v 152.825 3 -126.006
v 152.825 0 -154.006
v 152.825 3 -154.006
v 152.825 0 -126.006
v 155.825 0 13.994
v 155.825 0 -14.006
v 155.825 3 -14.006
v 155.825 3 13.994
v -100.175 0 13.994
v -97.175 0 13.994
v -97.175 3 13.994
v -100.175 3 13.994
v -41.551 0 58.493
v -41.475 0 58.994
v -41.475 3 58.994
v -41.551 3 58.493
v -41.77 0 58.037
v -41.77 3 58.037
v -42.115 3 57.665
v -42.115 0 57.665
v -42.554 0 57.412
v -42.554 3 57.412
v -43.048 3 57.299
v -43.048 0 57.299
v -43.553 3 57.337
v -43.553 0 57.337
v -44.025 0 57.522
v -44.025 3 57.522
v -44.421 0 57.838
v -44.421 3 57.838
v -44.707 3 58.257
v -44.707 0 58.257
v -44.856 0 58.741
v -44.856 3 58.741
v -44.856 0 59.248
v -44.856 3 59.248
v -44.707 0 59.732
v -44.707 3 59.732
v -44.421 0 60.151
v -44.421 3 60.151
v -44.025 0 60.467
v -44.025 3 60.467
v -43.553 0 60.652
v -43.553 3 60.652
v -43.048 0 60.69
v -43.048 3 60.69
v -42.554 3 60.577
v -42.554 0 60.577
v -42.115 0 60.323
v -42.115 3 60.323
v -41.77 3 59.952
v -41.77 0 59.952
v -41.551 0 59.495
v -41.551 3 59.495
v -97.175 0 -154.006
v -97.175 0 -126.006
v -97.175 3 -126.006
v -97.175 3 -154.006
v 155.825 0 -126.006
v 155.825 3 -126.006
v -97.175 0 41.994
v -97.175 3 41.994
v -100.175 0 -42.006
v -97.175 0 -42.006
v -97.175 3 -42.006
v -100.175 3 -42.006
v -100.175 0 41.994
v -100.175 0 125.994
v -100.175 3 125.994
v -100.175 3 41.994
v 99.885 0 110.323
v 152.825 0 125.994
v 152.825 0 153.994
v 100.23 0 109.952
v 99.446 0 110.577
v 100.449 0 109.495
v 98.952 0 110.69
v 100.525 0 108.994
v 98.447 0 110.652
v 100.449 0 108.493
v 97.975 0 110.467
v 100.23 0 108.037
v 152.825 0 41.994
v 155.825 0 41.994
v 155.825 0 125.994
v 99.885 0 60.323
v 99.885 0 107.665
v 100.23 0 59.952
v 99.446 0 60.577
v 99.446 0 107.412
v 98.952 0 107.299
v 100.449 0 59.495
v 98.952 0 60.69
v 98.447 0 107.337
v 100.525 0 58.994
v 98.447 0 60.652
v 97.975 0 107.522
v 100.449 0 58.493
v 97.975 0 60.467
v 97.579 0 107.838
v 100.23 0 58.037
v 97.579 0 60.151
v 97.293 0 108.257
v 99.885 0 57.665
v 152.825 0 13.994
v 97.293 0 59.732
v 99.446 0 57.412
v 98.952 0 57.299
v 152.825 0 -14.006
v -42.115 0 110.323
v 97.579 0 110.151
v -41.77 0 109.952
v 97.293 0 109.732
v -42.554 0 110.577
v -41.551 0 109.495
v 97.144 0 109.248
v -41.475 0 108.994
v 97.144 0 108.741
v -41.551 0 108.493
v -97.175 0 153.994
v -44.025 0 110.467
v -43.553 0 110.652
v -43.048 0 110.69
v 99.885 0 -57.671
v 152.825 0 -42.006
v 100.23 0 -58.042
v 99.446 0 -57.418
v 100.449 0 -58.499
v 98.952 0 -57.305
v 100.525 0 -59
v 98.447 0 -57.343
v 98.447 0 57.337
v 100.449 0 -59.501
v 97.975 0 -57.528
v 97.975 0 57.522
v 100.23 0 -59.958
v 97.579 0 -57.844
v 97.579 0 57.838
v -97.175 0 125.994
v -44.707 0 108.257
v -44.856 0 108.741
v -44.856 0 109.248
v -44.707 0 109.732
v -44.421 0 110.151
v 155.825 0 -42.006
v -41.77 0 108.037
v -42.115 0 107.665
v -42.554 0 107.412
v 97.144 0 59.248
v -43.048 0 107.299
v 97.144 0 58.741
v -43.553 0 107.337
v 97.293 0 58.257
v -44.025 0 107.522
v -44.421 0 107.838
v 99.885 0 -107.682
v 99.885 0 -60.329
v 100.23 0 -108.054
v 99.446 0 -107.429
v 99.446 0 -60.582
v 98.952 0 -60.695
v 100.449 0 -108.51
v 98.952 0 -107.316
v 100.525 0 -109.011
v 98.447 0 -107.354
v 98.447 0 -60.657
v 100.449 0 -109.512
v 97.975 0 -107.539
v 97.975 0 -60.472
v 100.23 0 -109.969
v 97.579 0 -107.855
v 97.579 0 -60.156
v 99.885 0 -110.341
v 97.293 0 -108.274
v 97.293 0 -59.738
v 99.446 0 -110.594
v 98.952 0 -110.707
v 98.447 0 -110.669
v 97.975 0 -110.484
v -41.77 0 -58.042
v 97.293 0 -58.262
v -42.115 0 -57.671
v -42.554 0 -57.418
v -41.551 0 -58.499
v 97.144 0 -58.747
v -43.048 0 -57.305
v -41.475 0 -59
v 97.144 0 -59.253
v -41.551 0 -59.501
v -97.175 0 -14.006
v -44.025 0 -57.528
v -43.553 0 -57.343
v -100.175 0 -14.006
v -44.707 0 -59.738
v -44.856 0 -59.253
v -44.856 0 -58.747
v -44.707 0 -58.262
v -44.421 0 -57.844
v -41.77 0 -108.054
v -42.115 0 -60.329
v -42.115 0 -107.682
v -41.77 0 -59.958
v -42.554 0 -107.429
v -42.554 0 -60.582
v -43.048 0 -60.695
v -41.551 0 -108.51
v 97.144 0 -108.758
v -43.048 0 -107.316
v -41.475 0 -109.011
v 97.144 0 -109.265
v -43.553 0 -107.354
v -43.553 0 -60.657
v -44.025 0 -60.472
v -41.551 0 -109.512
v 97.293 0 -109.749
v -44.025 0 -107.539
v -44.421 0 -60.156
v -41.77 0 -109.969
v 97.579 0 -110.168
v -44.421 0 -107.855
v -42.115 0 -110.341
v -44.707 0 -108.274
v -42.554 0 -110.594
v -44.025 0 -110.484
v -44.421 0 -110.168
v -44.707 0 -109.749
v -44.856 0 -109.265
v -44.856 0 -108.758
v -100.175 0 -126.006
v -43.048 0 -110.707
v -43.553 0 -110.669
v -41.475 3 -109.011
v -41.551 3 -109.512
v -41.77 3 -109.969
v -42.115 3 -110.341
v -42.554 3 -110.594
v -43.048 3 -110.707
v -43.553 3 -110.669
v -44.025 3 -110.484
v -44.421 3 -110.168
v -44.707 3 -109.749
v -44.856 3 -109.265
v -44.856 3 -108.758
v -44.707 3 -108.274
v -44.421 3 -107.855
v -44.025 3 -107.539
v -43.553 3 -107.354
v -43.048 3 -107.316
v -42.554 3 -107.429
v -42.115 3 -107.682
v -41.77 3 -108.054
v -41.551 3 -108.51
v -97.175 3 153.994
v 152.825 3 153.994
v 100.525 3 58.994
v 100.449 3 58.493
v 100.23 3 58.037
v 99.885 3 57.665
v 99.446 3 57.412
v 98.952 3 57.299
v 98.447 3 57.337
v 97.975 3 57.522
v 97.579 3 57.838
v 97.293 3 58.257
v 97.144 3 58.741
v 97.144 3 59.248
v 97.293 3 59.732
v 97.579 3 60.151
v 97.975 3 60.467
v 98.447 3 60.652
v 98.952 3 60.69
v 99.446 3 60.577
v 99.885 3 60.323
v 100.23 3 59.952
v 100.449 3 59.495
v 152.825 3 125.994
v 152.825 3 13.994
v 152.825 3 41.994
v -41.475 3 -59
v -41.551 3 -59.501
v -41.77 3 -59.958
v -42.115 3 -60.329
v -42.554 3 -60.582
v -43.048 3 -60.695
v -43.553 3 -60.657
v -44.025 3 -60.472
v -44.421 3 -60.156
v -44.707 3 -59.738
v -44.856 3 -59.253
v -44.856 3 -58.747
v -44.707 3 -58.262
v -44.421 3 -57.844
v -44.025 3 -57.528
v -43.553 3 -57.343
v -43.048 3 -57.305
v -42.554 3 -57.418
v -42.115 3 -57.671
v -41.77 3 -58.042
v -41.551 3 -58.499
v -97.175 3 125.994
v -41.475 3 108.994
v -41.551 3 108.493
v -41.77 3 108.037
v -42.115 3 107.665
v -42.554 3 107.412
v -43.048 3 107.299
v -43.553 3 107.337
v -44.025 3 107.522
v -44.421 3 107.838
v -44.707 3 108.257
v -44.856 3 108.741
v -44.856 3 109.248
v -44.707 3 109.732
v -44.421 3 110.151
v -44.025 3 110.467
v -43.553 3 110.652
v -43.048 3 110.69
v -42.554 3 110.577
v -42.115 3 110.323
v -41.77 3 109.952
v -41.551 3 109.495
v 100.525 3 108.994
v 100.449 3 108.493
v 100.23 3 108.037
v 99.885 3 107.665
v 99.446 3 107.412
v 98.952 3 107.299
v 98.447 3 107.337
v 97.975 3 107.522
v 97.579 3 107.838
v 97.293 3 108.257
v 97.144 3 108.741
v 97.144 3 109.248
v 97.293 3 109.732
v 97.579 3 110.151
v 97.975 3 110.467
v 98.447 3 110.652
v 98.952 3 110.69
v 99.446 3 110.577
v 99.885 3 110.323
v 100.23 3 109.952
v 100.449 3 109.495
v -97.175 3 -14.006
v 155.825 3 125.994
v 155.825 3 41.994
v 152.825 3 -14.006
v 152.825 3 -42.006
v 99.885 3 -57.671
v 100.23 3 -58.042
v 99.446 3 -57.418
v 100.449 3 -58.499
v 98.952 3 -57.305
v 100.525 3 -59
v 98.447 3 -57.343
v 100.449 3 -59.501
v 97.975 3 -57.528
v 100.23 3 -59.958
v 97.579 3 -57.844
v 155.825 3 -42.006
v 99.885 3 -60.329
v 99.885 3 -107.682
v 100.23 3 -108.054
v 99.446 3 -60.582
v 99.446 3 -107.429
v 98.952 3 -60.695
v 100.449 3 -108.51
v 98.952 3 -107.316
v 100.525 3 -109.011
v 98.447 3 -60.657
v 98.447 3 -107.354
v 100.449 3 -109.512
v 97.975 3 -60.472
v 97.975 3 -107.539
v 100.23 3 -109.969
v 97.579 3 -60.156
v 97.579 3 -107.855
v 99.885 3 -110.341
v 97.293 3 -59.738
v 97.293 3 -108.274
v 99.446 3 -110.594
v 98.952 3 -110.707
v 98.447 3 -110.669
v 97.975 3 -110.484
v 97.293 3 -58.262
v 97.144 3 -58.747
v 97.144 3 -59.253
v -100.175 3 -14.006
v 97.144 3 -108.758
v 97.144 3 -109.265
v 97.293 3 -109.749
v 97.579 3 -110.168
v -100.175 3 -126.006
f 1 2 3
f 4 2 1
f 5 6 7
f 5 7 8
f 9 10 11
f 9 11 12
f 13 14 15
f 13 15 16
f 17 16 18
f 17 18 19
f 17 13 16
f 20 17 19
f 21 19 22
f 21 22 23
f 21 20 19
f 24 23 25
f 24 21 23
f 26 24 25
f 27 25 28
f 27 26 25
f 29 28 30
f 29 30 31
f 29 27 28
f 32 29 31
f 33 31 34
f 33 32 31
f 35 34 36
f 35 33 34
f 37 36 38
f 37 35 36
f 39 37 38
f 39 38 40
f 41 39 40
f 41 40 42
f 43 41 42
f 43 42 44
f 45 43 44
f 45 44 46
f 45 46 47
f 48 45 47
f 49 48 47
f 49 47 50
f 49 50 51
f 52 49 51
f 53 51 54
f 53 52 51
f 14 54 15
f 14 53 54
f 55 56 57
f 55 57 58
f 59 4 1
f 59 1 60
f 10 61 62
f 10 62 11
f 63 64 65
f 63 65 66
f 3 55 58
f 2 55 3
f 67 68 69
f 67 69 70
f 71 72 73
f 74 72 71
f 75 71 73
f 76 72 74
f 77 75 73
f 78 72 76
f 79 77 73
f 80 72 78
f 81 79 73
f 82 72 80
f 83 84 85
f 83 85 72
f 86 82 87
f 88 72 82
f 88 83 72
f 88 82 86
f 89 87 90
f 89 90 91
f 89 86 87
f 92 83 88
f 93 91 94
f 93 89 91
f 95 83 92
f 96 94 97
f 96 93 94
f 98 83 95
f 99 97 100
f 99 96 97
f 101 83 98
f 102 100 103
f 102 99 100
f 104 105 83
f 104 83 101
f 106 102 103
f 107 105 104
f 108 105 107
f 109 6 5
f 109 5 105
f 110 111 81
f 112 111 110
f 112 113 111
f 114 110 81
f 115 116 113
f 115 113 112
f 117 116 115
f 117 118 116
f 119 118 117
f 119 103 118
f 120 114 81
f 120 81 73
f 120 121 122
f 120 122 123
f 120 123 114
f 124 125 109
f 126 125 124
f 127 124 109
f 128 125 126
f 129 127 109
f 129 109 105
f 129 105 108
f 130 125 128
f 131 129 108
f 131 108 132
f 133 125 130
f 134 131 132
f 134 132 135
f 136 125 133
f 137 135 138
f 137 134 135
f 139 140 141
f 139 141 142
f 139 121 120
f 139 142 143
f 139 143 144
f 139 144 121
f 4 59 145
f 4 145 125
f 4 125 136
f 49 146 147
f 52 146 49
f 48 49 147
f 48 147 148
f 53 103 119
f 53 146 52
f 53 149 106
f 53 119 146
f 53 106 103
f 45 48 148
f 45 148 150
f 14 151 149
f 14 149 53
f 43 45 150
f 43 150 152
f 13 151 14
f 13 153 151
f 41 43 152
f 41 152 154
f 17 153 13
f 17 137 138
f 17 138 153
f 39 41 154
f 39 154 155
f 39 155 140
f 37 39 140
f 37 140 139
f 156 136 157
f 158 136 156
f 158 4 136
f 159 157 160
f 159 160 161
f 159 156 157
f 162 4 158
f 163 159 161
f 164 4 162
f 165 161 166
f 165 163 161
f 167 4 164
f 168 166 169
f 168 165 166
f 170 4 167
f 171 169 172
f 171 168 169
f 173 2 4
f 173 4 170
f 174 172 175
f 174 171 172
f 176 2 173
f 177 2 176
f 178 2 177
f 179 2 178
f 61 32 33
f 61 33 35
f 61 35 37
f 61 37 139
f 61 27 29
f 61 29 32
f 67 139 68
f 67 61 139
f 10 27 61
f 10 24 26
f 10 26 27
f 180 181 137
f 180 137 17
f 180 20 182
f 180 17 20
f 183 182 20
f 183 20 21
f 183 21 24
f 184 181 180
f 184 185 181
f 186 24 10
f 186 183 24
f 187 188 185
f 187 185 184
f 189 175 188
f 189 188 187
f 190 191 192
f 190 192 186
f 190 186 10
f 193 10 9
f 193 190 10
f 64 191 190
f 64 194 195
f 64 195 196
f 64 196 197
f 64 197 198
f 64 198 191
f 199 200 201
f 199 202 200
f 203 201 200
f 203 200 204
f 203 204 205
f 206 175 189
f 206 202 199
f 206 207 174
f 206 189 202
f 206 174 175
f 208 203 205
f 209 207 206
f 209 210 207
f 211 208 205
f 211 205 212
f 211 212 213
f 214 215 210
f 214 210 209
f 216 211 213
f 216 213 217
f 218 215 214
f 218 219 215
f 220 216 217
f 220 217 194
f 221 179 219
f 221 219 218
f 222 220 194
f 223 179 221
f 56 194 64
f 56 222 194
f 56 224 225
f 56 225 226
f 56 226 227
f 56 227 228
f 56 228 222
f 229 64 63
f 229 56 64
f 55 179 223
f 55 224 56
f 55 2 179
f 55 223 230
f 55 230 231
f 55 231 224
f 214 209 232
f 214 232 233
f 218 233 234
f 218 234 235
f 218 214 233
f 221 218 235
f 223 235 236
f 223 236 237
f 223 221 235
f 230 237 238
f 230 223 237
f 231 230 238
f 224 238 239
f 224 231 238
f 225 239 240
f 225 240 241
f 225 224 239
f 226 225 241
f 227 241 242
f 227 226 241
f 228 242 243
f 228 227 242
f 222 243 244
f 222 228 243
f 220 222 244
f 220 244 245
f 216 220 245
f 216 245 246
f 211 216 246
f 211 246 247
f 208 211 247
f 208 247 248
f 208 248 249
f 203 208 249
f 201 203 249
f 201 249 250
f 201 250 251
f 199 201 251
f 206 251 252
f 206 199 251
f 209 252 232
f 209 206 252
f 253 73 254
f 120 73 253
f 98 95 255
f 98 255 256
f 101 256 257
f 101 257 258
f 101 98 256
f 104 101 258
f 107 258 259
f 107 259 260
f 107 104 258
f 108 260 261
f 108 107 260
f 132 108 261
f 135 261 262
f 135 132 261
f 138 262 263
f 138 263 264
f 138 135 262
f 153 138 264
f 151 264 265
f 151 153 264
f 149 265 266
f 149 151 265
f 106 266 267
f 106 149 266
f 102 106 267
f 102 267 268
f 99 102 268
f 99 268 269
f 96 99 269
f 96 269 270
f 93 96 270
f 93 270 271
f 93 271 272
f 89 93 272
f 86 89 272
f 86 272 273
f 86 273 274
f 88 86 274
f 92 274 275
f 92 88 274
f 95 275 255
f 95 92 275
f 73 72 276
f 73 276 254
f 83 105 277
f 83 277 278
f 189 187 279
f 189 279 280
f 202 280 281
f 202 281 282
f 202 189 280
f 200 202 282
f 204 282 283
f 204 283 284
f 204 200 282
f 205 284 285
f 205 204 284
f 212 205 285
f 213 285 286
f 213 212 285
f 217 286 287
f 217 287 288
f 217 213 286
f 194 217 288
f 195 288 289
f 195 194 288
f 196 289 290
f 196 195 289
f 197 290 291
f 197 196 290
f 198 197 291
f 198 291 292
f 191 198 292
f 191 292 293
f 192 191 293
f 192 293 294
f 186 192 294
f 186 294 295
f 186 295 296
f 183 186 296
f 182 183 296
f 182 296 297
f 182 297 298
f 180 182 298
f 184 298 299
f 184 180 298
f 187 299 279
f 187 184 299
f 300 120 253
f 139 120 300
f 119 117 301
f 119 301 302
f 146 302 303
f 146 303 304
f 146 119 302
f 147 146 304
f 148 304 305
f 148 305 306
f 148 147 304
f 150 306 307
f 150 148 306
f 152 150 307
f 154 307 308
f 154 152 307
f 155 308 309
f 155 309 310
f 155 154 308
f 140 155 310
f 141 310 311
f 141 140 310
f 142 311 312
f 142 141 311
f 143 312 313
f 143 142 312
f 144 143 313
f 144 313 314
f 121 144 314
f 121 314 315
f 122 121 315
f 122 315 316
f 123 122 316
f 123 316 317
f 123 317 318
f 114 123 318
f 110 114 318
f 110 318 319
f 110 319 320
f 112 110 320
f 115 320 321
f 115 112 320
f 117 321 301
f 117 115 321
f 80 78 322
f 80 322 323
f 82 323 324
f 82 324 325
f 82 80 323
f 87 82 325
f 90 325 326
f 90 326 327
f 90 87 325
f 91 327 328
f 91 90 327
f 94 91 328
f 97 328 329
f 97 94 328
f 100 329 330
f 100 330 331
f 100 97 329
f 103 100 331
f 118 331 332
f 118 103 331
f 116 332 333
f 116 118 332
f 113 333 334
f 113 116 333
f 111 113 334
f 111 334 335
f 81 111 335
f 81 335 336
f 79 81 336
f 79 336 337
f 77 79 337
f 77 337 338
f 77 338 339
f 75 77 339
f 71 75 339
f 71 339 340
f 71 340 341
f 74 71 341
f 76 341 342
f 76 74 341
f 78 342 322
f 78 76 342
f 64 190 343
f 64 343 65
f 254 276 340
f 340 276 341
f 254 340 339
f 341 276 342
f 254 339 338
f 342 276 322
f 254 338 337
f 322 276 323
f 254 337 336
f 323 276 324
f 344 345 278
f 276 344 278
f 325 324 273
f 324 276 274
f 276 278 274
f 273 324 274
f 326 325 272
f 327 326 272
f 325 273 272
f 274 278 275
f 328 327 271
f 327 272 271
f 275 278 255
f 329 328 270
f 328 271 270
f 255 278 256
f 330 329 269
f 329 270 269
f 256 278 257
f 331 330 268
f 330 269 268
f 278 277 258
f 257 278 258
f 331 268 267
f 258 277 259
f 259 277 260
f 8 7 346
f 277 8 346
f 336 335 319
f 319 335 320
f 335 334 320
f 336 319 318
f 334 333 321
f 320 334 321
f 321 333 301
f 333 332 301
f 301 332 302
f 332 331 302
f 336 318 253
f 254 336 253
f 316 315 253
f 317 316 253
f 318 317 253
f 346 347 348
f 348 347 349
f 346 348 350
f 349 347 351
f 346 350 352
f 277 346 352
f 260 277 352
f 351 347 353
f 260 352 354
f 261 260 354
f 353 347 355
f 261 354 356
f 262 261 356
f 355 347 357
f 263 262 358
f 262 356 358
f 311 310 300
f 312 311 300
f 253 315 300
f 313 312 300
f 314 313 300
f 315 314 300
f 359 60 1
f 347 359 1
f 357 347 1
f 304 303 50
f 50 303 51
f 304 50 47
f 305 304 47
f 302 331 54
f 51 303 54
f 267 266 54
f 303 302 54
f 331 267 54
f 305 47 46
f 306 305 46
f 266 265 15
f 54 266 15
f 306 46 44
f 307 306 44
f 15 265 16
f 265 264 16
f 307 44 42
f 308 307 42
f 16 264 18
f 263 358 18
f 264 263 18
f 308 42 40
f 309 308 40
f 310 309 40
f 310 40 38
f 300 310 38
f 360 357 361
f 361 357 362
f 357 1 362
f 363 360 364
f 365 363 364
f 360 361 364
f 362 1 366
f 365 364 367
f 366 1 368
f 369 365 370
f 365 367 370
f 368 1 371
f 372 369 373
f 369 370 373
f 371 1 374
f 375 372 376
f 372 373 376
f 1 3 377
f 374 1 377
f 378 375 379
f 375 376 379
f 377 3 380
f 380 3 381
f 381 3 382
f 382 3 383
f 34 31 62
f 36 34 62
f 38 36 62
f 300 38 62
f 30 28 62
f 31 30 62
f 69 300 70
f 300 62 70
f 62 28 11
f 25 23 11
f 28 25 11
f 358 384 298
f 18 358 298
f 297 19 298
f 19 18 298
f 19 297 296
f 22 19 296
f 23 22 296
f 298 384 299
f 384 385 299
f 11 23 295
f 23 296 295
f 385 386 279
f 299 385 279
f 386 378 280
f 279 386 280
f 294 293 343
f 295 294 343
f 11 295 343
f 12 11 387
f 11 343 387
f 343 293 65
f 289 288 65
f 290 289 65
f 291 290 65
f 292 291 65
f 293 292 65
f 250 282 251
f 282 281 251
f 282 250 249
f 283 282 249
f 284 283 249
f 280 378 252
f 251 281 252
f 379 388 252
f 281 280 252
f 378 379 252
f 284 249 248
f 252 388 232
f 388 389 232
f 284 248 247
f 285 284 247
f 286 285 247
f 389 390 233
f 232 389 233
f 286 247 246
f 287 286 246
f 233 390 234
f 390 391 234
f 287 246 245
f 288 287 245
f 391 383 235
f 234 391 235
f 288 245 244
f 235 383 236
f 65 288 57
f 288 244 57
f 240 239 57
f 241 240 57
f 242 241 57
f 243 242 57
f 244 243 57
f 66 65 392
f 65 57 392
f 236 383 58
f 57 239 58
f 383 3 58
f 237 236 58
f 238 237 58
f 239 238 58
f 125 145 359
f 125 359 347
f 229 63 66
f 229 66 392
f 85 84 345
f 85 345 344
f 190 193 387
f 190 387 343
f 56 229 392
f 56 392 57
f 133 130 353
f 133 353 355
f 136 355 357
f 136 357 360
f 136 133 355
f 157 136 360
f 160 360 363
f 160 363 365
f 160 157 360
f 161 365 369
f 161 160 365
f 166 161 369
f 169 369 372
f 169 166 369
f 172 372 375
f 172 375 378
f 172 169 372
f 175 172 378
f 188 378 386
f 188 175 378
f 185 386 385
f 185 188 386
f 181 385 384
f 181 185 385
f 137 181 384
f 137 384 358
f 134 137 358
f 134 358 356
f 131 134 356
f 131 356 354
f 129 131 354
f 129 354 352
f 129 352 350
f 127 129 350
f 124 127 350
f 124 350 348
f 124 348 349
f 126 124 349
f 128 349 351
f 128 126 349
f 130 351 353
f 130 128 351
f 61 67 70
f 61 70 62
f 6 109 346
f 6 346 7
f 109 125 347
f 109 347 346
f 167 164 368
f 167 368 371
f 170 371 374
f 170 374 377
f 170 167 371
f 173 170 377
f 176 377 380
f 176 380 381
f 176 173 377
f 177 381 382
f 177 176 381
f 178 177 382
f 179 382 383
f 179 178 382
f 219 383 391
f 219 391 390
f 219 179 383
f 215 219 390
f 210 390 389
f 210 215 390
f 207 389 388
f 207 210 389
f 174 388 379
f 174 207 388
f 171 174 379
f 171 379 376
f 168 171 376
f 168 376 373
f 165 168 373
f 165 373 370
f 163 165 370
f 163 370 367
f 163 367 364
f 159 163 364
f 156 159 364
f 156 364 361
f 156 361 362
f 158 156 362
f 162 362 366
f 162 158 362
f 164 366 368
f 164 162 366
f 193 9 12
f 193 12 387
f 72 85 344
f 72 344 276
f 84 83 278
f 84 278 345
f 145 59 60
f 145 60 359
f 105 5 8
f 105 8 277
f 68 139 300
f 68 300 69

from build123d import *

# Parameters (mm, degrees)
CROQUIS1_R              = 1.7
SALIENTE_EXTRUIR1_DEPTH = 3


with BuildPart() as part:
    # Croquis1 → Saliente-Extruir1 (new body)
    with BuildSketch(Plane(origin=(0, 0, 0), x_dir=(1, 0, 0), z_dir=(0, 1, 0))):
        Polygon((-97.174990899, 154.00569786), (152.825009101, 154.00569786), (152.825009101, 126.00569786), (155.825009101, 126.00569786), (155.825009101, 42.00569786), (152.825009101, 42.00569786), (152.825009101, 14.00569786), (155.825009101, 14.00569786), (155.825009101, -13.99430214), (152.825009101, -13.99430214), (152.825009101, -41.99430214), (155.825009101, -41.99430214), (155.825009101, -125.99430214), (152.825009101, -125.99430214), (152.825009101, -153.99430214), (-97.174990899, -153.99430214), (-97.174990899, -125.99430214), (-100.174990899, -125.99430214), (-100.174990899, -41.99430214), (-97.174990899, -41.99430214), (-97.174990899, -13.99430214), (-100.174990899, -13.99430214), (-100.174990899, 14.00569786), (-97.174990899, 14.00569786), (-97.174990899, 42.00569786), (-100.174990899, 42.00569786), (-100.174990899, 126.00569786), (-97.174990899, 126.00569786), align=None)
        with Locations((-43.174990899, 109.01139572)):
            Circle(CROQUIS1_R, mode=Mode.SUBTRACT)
        with Locations((-43.174990899, 59)):
            Circle(CROQUIS1_R, mode=Mode.SUBTRACT)
        with Locations((-43.174990899, -58.99430214)):
            Circle(CROQUIS1_R, mode=Mode.SUBTRACT)
        with Locations((-43.174990899, -108.99430214)):
            Circle(CROQUIS1_R, mode=Mode.SUBTRACT)
        with Locations((98.825009101, 59)):
            Circle(CROQUIS1_R, mode=Mode.SUBTRACT)
        with Locations((98.825009101, 109.01139572)):
            Circle(CROQUIS1_R, mode=Mode.SUBTRACT)
        with Locations((98.825009101, -108.99430214)):
            Circle(CROQUIS1_R, mode=Mode.SUBTRACT)
        with Locations((98.825009101, -58.99430214)):
            Circle(CROQUIS1_R, mode=Mode.SUBTRACT)
    extrude(amount=SALIENTE_EXTRUIR1_DEPTH)


solid = part.part
